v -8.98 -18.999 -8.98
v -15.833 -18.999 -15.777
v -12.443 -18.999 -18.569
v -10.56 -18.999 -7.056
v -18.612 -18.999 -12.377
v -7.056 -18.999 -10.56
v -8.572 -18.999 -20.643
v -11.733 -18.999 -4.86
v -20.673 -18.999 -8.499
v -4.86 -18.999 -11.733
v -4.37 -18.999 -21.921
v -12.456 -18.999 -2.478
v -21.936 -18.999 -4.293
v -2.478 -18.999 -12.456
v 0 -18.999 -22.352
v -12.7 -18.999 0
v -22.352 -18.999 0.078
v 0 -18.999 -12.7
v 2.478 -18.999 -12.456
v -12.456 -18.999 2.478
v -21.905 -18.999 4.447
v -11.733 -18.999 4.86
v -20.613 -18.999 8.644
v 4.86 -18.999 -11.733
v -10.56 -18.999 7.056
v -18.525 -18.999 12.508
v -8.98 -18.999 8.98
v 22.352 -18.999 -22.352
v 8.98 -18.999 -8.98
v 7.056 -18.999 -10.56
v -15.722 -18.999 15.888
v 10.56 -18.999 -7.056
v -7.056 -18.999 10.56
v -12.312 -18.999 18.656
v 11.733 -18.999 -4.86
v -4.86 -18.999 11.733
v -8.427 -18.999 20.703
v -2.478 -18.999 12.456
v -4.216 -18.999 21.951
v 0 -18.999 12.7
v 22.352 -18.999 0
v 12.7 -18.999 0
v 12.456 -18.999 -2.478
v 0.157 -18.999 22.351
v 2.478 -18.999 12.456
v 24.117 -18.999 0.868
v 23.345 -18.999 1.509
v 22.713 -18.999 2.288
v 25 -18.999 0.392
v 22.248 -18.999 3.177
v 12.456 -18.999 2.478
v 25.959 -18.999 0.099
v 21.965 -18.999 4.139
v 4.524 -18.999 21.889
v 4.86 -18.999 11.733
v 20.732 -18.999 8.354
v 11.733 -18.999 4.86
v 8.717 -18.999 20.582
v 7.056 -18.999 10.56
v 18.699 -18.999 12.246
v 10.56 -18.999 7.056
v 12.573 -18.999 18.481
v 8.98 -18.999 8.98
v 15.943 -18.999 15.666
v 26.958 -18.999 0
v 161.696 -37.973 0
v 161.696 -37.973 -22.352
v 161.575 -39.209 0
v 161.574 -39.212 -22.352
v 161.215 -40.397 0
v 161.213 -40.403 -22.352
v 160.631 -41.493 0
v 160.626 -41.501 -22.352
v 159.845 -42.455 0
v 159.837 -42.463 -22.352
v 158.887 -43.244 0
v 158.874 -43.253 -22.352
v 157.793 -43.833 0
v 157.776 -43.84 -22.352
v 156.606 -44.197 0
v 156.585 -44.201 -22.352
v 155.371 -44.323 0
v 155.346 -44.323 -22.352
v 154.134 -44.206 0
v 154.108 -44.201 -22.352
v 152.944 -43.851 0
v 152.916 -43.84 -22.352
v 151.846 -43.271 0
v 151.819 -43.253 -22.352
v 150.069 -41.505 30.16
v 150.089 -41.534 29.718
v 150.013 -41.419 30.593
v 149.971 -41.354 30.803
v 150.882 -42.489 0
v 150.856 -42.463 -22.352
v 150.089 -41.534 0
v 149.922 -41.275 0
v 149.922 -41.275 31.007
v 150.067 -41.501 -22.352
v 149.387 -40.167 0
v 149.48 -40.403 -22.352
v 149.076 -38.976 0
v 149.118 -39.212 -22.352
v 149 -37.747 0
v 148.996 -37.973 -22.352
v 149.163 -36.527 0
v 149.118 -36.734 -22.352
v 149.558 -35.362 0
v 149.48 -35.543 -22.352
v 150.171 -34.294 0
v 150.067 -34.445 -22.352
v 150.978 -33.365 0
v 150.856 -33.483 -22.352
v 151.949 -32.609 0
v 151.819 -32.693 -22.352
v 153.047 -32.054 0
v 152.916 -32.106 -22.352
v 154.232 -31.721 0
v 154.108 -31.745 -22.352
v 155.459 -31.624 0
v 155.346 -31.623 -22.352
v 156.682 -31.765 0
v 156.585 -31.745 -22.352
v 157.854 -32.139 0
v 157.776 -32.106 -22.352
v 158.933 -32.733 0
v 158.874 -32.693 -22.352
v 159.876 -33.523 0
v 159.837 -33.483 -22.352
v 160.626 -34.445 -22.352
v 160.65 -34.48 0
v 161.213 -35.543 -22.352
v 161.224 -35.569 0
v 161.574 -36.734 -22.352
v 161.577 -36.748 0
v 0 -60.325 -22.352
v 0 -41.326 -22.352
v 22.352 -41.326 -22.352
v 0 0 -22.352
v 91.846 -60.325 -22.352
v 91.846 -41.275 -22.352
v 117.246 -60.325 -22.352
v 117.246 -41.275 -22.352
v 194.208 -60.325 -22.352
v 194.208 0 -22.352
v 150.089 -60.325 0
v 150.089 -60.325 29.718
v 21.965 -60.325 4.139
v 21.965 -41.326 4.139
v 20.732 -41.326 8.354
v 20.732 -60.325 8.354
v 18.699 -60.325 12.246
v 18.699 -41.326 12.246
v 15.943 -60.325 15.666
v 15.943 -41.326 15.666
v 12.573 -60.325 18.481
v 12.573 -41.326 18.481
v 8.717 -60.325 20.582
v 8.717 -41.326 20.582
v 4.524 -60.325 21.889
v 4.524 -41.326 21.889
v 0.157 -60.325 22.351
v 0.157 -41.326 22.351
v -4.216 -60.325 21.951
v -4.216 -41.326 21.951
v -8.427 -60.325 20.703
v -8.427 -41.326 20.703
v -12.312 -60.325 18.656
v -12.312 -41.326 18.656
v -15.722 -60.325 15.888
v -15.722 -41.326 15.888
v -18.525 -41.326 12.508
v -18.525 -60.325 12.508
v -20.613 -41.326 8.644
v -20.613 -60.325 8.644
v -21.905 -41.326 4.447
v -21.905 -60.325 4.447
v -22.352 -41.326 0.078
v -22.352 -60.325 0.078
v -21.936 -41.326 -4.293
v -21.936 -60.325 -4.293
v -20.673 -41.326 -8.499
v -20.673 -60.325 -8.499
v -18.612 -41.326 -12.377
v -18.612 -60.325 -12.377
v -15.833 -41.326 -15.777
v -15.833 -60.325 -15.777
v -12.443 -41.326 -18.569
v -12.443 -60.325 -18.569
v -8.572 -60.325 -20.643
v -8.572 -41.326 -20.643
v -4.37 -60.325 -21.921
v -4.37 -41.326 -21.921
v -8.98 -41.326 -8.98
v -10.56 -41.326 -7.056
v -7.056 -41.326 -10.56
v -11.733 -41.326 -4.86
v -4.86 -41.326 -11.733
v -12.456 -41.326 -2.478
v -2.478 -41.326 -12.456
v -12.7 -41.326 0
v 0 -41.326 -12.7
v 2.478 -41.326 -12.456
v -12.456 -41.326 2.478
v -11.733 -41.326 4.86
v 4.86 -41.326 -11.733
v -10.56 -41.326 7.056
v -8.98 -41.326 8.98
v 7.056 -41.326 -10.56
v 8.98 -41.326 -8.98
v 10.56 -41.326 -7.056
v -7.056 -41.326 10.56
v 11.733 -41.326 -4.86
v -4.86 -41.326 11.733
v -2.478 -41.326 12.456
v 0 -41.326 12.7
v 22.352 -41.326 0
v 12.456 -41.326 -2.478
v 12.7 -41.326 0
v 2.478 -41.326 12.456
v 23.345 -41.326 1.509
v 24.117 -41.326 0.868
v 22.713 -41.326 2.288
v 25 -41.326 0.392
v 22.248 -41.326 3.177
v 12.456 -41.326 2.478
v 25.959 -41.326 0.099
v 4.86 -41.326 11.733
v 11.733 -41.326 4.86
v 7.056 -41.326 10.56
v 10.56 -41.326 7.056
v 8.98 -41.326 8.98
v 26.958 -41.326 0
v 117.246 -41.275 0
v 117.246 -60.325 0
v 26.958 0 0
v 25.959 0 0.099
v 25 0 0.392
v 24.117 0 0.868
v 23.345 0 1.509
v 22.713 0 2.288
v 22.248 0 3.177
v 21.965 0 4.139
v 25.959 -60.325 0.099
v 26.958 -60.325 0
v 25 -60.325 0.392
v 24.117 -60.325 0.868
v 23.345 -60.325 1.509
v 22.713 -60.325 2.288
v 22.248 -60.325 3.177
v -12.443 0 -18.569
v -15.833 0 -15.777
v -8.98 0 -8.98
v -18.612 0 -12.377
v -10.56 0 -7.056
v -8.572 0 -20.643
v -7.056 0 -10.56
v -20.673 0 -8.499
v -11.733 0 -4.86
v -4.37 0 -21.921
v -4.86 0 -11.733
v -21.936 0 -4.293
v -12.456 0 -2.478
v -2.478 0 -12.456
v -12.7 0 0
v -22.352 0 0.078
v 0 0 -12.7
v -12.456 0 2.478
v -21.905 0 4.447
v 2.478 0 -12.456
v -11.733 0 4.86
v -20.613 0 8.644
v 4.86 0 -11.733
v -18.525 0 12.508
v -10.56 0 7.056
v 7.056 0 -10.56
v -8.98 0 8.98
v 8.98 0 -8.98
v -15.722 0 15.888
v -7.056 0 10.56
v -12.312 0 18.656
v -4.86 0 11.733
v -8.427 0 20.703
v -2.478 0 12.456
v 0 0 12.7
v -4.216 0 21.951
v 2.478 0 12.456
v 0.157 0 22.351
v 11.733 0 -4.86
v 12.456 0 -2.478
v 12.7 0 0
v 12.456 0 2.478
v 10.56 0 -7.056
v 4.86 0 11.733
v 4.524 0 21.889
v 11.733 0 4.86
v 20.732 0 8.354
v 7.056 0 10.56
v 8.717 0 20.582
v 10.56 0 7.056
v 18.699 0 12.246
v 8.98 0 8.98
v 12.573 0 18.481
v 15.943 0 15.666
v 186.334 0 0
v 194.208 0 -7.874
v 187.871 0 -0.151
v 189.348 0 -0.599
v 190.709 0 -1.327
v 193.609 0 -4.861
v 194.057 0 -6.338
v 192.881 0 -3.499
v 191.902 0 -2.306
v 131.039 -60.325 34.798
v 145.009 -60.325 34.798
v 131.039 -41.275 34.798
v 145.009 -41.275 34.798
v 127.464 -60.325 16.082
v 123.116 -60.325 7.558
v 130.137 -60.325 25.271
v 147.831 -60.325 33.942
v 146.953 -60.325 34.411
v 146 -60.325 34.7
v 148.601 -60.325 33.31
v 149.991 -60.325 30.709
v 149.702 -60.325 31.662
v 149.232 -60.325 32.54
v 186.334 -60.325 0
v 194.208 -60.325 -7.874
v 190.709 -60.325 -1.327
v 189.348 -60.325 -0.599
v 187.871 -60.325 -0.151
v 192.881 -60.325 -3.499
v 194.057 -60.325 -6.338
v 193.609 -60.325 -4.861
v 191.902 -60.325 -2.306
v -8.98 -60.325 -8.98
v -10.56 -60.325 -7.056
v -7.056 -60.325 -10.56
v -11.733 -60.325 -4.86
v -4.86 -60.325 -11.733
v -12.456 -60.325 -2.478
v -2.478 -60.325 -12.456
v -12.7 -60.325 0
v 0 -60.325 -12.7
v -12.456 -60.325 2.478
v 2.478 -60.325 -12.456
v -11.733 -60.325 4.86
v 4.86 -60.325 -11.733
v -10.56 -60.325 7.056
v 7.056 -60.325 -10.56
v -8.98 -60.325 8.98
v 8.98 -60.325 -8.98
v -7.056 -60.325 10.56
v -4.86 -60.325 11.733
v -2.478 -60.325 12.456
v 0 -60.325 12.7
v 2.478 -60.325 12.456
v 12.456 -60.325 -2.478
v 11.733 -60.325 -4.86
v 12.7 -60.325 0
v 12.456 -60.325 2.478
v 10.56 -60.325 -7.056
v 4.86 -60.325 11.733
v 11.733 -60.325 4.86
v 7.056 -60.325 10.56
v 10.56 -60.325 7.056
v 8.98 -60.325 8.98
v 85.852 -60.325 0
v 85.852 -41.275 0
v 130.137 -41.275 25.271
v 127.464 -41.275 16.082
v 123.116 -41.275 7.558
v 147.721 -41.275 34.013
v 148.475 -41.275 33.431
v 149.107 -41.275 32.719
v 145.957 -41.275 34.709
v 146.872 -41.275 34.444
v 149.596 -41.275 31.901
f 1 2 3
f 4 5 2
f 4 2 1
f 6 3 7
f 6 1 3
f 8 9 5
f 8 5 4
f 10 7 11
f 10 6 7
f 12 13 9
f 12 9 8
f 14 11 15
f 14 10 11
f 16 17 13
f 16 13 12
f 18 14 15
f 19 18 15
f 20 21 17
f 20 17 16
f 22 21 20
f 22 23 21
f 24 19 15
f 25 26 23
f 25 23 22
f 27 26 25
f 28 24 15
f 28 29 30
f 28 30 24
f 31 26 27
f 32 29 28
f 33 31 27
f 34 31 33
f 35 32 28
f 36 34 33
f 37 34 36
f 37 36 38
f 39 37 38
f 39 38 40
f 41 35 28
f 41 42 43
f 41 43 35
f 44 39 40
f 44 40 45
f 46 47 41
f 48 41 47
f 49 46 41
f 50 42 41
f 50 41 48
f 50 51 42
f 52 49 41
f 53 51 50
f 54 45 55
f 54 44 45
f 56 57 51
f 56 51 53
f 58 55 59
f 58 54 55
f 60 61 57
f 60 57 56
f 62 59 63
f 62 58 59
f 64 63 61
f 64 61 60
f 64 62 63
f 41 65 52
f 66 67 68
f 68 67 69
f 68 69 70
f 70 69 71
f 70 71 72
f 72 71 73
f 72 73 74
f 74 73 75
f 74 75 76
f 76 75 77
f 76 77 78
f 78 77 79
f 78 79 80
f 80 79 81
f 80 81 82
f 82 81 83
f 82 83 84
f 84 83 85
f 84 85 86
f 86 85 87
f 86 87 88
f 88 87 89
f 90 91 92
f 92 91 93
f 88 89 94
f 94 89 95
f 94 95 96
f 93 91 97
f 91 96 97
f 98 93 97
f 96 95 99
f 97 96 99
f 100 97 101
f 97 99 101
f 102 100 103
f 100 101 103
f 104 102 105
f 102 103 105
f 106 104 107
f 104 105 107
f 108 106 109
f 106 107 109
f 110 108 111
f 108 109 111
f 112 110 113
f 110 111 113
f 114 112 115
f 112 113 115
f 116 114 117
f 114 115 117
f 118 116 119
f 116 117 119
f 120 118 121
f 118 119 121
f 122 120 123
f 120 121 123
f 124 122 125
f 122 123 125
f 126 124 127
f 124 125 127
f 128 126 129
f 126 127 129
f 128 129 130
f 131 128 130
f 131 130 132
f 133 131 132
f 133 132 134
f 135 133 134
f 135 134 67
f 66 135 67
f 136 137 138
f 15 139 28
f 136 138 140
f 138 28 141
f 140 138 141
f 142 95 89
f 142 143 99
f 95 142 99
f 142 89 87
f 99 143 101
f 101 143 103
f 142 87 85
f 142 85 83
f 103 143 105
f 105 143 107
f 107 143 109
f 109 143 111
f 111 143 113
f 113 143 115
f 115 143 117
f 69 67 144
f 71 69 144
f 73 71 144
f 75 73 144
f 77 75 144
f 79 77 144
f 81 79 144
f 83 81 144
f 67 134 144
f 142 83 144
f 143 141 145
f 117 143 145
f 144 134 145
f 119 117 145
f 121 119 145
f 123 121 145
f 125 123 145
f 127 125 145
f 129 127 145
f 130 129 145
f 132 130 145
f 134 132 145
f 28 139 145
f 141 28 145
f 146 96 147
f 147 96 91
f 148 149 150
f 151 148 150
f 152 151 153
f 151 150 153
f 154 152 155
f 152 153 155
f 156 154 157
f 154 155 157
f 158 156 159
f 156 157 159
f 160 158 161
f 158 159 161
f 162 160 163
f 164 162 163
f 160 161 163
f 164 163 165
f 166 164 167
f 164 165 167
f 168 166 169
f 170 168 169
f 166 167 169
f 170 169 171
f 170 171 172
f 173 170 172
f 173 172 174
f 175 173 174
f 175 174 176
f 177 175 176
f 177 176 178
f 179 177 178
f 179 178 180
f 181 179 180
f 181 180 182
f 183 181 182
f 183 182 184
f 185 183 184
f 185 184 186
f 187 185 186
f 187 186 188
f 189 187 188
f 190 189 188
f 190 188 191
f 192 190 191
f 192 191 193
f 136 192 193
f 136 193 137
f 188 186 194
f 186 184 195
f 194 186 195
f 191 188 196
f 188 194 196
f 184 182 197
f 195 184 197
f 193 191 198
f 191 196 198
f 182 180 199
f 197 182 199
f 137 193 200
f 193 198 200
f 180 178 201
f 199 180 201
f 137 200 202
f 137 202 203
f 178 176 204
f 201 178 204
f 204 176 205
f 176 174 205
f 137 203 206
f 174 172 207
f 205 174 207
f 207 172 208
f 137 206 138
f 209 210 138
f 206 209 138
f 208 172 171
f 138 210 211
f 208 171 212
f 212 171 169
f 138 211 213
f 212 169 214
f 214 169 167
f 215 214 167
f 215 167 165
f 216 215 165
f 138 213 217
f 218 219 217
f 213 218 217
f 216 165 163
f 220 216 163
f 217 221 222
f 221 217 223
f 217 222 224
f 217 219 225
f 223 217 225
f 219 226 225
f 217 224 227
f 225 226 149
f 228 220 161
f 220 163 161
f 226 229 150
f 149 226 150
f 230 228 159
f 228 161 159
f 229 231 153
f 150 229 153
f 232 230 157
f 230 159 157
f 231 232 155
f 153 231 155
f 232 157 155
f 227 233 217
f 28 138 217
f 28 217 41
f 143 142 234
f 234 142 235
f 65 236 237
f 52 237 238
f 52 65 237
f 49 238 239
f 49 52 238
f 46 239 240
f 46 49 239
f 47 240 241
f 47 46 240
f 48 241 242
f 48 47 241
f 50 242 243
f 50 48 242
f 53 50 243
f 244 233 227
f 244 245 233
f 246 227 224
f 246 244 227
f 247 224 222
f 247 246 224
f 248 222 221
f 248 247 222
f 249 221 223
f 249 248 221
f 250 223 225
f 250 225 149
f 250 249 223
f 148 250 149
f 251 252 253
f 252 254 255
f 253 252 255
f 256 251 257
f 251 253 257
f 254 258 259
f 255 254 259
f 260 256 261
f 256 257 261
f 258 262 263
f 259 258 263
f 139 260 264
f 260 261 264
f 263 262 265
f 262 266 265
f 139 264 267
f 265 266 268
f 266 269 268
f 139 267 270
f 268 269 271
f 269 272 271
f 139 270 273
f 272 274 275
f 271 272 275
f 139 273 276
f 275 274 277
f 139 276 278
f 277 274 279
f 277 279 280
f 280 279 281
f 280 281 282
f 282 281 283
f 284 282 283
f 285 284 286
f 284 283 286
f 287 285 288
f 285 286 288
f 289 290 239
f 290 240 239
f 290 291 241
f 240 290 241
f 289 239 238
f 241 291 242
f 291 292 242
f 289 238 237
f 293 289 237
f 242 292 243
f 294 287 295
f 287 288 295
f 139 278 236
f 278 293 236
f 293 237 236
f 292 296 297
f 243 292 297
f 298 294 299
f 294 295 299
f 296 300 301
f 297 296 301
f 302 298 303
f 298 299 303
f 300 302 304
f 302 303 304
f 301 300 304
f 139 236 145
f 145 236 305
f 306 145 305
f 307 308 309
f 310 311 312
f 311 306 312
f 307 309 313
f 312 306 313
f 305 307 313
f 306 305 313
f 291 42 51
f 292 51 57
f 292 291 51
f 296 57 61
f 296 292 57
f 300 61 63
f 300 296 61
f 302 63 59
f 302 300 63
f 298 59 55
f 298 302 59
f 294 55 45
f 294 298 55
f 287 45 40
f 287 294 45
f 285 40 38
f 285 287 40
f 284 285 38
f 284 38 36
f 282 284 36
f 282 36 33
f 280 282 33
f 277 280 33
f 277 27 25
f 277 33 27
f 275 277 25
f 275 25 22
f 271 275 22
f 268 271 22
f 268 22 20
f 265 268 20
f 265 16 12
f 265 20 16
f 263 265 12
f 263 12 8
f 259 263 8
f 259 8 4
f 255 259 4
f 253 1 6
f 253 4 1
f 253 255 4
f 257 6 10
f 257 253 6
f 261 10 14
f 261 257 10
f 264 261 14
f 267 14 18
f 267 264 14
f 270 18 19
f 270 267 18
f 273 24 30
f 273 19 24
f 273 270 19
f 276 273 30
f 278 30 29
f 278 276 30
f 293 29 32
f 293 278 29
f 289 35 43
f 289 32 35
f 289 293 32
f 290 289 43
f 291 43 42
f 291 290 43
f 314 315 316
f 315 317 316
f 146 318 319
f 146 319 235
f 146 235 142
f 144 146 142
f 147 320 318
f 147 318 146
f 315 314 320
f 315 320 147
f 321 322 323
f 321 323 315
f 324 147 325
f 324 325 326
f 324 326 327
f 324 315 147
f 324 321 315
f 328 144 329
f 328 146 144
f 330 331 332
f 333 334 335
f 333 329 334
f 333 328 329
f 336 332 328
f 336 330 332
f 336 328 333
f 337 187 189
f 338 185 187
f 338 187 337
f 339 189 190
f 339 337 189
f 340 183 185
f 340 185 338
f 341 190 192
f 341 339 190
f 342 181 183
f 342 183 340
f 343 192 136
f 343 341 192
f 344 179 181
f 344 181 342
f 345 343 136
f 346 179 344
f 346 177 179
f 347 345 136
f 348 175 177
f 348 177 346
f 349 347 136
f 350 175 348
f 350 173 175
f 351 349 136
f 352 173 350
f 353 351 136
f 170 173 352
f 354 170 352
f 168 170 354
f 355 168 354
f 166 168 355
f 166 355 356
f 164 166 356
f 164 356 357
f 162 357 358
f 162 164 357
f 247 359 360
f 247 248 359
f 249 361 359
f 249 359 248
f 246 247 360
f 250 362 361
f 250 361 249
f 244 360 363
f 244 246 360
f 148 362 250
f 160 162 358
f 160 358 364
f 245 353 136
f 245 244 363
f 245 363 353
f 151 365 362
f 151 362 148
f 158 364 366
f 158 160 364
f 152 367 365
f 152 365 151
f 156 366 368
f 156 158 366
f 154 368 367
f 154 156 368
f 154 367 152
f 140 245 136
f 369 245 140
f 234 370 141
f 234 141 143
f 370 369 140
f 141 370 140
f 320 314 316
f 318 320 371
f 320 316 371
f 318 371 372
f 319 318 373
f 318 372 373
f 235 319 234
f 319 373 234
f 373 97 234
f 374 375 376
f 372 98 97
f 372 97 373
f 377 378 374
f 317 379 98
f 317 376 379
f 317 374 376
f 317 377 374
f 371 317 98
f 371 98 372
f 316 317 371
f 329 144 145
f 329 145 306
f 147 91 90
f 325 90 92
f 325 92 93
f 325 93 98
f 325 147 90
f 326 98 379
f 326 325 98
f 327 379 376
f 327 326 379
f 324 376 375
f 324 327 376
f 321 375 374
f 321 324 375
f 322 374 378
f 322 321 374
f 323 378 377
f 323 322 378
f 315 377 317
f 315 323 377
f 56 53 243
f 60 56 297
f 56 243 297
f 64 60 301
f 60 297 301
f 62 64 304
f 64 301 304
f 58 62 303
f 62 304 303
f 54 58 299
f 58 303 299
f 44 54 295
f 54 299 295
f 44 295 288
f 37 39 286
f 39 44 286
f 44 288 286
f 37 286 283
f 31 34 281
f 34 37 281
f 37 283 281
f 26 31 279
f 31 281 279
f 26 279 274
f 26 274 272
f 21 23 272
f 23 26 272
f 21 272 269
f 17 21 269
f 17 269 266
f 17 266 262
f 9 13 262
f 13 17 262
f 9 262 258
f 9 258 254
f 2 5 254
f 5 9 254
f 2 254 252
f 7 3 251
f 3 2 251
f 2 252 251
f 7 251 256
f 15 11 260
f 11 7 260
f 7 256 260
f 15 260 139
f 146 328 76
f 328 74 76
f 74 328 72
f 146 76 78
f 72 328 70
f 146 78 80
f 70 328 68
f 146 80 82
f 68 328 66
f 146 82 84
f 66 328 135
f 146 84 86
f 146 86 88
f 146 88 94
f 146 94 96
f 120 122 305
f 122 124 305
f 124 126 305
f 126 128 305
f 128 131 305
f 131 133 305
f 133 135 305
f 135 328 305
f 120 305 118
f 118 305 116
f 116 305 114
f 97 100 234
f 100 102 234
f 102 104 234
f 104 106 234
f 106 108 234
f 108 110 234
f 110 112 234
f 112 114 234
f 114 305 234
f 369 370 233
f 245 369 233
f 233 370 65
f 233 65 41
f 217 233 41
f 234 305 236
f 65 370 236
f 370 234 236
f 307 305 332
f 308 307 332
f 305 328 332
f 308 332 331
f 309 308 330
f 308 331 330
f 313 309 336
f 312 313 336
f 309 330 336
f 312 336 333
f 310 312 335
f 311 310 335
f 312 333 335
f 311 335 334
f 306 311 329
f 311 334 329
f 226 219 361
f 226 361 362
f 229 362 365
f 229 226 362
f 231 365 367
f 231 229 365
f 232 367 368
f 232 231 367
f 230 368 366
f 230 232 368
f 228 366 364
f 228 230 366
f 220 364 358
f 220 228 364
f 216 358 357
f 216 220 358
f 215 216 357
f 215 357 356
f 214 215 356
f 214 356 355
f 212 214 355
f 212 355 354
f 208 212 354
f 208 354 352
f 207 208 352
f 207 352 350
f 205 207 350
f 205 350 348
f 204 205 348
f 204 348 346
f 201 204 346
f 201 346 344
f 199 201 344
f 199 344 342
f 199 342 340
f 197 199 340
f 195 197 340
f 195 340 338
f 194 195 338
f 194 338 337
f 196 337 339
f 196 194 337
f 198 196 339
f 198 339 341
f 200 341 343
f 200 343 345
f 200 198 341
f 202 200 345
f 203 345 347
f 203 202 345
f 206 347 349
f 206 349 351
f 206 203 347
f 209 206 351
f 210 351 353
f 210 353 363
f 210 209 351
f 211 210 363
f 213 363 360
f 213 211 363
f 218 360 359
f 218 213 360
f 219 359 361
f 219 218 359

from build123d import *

# Parameters (mm, degrees)
F0_R     = 12.7
F1_DEPTH = 60.325
F3_DEPTH = 19.05
F5_DEPTH = 41.275
F6_R     = 6.35
F7_DEPTH = 57.151
F8_W     = 57.6777060051
F8_H     = 22.3266
F9_DEPTH = 25.4
F10_R    = 7.874
F11_R    = 5.08
F12_R    = 5.08


with BuildPart() as f1:
    # F0 (on Front) → F1 (new body)
    with BuildSketch(Plane.XZ):
        with BuildLine():
            ThreePointArc((22.352, 0), (-15.8052507731, 15.8052507731), (0, -22.352))
            Line((0, -22.352), (194.2084, -22.352))
            Line((194.2084, -22.352), (194.2084, 0))
            Line((194.2084, 0), (150.0886, 0))
            Line((150.0886, 0), (150.0886, 34.798))
            Line((150.0886, 34.798), (131.0386, 34.798))
            ThreePointArc((131.0386, 34.798), (127.4644153616, 16.0823576341), (117.2464, 0))
            Line((117.2464, 0), (85.852, 0))
            Line((85.852, 0), (22.352, 0))
        make_face()
        Circle(F0_R, mode=Mode.SUBTRACT)
    extrude(amount=F1_DEPTH)

    # F2 (on face) → F3 (cut)
    with BuildSketch(Plane.XZ.offset(60.325)):
        Polygon((117.2464, 0), (85.852, 0), (91.8464, -22.352), (117.2464, -22.352), align=None)
    extrude(amount=-F3_DEPTH, mode=Mode.SUBTRACT)

    # F4 (on face) → F5 (cut)
    with BuildSketch(Plane(origin=(0, 0, 0), x_dir=(-1, 0, 0), z_dir=(0, 1, 0))):
        with BuildLine():
            Line((-150.0886, 34.798), (-150.0886, 0))
            Line((-150.0886, 0), (-117.2464, 0))
            ThreePointArc((-117.2464, 0), (-127.4644153616, 16.0823576341), (-131.0386, 34.798))
            Line((-131.0386, 34.798), (-150.0886, 34.798))
        make_face()
    extrude(amount=-F5_DEPTH, mode=Mode.SUBTRACT)

    # F6 (on face) → F7 (cut, through all)
    with BuildSketch(Plane(origin=(0, 0, -22.352), x_dir=(1, 0, 0), z_dir=(0, 0, -1))):
        with Locations((155.3464, 37.973)):
            Circle(F6_R)
    extrude(amount=-F7_DEPTH, mode=Mode.SUBTRACT)

    # F8 (on face) → F9 (cut, symmetric)
    with BuildSketch(Plane.XY):
        with Locations((-6.4868530025, -30.1625)):
            Rectangle(F8_W, F8_H)
    extrude(amount=F9_DEPTH, both=True, mode=Mode.SUBTRACT)

    # F10
    f10_edges = [f1.edges().sort_by_distance(p)[0] for p in [
        (194.2084, -30.1625, 0),
    ]]
    fillet(f10_edges, radius=F10_R)

    # F11
    f11_edges = [f1.edges().sort_by_distance(p)[0] for p in [
        (150.0886, -50.929312, 34.798),
    ]]
    fillet(f11_edges, radius=F11_R)

    # F12
    f12_edges = [f1.edges().sort_by_distance(p)[0] for p in [
        (22.352, -9.4996, 0),
        (22.352, -50.8254, 0),
    ]]
    fillet(f12_edges, radius=F12_R)


solid = f1.part
